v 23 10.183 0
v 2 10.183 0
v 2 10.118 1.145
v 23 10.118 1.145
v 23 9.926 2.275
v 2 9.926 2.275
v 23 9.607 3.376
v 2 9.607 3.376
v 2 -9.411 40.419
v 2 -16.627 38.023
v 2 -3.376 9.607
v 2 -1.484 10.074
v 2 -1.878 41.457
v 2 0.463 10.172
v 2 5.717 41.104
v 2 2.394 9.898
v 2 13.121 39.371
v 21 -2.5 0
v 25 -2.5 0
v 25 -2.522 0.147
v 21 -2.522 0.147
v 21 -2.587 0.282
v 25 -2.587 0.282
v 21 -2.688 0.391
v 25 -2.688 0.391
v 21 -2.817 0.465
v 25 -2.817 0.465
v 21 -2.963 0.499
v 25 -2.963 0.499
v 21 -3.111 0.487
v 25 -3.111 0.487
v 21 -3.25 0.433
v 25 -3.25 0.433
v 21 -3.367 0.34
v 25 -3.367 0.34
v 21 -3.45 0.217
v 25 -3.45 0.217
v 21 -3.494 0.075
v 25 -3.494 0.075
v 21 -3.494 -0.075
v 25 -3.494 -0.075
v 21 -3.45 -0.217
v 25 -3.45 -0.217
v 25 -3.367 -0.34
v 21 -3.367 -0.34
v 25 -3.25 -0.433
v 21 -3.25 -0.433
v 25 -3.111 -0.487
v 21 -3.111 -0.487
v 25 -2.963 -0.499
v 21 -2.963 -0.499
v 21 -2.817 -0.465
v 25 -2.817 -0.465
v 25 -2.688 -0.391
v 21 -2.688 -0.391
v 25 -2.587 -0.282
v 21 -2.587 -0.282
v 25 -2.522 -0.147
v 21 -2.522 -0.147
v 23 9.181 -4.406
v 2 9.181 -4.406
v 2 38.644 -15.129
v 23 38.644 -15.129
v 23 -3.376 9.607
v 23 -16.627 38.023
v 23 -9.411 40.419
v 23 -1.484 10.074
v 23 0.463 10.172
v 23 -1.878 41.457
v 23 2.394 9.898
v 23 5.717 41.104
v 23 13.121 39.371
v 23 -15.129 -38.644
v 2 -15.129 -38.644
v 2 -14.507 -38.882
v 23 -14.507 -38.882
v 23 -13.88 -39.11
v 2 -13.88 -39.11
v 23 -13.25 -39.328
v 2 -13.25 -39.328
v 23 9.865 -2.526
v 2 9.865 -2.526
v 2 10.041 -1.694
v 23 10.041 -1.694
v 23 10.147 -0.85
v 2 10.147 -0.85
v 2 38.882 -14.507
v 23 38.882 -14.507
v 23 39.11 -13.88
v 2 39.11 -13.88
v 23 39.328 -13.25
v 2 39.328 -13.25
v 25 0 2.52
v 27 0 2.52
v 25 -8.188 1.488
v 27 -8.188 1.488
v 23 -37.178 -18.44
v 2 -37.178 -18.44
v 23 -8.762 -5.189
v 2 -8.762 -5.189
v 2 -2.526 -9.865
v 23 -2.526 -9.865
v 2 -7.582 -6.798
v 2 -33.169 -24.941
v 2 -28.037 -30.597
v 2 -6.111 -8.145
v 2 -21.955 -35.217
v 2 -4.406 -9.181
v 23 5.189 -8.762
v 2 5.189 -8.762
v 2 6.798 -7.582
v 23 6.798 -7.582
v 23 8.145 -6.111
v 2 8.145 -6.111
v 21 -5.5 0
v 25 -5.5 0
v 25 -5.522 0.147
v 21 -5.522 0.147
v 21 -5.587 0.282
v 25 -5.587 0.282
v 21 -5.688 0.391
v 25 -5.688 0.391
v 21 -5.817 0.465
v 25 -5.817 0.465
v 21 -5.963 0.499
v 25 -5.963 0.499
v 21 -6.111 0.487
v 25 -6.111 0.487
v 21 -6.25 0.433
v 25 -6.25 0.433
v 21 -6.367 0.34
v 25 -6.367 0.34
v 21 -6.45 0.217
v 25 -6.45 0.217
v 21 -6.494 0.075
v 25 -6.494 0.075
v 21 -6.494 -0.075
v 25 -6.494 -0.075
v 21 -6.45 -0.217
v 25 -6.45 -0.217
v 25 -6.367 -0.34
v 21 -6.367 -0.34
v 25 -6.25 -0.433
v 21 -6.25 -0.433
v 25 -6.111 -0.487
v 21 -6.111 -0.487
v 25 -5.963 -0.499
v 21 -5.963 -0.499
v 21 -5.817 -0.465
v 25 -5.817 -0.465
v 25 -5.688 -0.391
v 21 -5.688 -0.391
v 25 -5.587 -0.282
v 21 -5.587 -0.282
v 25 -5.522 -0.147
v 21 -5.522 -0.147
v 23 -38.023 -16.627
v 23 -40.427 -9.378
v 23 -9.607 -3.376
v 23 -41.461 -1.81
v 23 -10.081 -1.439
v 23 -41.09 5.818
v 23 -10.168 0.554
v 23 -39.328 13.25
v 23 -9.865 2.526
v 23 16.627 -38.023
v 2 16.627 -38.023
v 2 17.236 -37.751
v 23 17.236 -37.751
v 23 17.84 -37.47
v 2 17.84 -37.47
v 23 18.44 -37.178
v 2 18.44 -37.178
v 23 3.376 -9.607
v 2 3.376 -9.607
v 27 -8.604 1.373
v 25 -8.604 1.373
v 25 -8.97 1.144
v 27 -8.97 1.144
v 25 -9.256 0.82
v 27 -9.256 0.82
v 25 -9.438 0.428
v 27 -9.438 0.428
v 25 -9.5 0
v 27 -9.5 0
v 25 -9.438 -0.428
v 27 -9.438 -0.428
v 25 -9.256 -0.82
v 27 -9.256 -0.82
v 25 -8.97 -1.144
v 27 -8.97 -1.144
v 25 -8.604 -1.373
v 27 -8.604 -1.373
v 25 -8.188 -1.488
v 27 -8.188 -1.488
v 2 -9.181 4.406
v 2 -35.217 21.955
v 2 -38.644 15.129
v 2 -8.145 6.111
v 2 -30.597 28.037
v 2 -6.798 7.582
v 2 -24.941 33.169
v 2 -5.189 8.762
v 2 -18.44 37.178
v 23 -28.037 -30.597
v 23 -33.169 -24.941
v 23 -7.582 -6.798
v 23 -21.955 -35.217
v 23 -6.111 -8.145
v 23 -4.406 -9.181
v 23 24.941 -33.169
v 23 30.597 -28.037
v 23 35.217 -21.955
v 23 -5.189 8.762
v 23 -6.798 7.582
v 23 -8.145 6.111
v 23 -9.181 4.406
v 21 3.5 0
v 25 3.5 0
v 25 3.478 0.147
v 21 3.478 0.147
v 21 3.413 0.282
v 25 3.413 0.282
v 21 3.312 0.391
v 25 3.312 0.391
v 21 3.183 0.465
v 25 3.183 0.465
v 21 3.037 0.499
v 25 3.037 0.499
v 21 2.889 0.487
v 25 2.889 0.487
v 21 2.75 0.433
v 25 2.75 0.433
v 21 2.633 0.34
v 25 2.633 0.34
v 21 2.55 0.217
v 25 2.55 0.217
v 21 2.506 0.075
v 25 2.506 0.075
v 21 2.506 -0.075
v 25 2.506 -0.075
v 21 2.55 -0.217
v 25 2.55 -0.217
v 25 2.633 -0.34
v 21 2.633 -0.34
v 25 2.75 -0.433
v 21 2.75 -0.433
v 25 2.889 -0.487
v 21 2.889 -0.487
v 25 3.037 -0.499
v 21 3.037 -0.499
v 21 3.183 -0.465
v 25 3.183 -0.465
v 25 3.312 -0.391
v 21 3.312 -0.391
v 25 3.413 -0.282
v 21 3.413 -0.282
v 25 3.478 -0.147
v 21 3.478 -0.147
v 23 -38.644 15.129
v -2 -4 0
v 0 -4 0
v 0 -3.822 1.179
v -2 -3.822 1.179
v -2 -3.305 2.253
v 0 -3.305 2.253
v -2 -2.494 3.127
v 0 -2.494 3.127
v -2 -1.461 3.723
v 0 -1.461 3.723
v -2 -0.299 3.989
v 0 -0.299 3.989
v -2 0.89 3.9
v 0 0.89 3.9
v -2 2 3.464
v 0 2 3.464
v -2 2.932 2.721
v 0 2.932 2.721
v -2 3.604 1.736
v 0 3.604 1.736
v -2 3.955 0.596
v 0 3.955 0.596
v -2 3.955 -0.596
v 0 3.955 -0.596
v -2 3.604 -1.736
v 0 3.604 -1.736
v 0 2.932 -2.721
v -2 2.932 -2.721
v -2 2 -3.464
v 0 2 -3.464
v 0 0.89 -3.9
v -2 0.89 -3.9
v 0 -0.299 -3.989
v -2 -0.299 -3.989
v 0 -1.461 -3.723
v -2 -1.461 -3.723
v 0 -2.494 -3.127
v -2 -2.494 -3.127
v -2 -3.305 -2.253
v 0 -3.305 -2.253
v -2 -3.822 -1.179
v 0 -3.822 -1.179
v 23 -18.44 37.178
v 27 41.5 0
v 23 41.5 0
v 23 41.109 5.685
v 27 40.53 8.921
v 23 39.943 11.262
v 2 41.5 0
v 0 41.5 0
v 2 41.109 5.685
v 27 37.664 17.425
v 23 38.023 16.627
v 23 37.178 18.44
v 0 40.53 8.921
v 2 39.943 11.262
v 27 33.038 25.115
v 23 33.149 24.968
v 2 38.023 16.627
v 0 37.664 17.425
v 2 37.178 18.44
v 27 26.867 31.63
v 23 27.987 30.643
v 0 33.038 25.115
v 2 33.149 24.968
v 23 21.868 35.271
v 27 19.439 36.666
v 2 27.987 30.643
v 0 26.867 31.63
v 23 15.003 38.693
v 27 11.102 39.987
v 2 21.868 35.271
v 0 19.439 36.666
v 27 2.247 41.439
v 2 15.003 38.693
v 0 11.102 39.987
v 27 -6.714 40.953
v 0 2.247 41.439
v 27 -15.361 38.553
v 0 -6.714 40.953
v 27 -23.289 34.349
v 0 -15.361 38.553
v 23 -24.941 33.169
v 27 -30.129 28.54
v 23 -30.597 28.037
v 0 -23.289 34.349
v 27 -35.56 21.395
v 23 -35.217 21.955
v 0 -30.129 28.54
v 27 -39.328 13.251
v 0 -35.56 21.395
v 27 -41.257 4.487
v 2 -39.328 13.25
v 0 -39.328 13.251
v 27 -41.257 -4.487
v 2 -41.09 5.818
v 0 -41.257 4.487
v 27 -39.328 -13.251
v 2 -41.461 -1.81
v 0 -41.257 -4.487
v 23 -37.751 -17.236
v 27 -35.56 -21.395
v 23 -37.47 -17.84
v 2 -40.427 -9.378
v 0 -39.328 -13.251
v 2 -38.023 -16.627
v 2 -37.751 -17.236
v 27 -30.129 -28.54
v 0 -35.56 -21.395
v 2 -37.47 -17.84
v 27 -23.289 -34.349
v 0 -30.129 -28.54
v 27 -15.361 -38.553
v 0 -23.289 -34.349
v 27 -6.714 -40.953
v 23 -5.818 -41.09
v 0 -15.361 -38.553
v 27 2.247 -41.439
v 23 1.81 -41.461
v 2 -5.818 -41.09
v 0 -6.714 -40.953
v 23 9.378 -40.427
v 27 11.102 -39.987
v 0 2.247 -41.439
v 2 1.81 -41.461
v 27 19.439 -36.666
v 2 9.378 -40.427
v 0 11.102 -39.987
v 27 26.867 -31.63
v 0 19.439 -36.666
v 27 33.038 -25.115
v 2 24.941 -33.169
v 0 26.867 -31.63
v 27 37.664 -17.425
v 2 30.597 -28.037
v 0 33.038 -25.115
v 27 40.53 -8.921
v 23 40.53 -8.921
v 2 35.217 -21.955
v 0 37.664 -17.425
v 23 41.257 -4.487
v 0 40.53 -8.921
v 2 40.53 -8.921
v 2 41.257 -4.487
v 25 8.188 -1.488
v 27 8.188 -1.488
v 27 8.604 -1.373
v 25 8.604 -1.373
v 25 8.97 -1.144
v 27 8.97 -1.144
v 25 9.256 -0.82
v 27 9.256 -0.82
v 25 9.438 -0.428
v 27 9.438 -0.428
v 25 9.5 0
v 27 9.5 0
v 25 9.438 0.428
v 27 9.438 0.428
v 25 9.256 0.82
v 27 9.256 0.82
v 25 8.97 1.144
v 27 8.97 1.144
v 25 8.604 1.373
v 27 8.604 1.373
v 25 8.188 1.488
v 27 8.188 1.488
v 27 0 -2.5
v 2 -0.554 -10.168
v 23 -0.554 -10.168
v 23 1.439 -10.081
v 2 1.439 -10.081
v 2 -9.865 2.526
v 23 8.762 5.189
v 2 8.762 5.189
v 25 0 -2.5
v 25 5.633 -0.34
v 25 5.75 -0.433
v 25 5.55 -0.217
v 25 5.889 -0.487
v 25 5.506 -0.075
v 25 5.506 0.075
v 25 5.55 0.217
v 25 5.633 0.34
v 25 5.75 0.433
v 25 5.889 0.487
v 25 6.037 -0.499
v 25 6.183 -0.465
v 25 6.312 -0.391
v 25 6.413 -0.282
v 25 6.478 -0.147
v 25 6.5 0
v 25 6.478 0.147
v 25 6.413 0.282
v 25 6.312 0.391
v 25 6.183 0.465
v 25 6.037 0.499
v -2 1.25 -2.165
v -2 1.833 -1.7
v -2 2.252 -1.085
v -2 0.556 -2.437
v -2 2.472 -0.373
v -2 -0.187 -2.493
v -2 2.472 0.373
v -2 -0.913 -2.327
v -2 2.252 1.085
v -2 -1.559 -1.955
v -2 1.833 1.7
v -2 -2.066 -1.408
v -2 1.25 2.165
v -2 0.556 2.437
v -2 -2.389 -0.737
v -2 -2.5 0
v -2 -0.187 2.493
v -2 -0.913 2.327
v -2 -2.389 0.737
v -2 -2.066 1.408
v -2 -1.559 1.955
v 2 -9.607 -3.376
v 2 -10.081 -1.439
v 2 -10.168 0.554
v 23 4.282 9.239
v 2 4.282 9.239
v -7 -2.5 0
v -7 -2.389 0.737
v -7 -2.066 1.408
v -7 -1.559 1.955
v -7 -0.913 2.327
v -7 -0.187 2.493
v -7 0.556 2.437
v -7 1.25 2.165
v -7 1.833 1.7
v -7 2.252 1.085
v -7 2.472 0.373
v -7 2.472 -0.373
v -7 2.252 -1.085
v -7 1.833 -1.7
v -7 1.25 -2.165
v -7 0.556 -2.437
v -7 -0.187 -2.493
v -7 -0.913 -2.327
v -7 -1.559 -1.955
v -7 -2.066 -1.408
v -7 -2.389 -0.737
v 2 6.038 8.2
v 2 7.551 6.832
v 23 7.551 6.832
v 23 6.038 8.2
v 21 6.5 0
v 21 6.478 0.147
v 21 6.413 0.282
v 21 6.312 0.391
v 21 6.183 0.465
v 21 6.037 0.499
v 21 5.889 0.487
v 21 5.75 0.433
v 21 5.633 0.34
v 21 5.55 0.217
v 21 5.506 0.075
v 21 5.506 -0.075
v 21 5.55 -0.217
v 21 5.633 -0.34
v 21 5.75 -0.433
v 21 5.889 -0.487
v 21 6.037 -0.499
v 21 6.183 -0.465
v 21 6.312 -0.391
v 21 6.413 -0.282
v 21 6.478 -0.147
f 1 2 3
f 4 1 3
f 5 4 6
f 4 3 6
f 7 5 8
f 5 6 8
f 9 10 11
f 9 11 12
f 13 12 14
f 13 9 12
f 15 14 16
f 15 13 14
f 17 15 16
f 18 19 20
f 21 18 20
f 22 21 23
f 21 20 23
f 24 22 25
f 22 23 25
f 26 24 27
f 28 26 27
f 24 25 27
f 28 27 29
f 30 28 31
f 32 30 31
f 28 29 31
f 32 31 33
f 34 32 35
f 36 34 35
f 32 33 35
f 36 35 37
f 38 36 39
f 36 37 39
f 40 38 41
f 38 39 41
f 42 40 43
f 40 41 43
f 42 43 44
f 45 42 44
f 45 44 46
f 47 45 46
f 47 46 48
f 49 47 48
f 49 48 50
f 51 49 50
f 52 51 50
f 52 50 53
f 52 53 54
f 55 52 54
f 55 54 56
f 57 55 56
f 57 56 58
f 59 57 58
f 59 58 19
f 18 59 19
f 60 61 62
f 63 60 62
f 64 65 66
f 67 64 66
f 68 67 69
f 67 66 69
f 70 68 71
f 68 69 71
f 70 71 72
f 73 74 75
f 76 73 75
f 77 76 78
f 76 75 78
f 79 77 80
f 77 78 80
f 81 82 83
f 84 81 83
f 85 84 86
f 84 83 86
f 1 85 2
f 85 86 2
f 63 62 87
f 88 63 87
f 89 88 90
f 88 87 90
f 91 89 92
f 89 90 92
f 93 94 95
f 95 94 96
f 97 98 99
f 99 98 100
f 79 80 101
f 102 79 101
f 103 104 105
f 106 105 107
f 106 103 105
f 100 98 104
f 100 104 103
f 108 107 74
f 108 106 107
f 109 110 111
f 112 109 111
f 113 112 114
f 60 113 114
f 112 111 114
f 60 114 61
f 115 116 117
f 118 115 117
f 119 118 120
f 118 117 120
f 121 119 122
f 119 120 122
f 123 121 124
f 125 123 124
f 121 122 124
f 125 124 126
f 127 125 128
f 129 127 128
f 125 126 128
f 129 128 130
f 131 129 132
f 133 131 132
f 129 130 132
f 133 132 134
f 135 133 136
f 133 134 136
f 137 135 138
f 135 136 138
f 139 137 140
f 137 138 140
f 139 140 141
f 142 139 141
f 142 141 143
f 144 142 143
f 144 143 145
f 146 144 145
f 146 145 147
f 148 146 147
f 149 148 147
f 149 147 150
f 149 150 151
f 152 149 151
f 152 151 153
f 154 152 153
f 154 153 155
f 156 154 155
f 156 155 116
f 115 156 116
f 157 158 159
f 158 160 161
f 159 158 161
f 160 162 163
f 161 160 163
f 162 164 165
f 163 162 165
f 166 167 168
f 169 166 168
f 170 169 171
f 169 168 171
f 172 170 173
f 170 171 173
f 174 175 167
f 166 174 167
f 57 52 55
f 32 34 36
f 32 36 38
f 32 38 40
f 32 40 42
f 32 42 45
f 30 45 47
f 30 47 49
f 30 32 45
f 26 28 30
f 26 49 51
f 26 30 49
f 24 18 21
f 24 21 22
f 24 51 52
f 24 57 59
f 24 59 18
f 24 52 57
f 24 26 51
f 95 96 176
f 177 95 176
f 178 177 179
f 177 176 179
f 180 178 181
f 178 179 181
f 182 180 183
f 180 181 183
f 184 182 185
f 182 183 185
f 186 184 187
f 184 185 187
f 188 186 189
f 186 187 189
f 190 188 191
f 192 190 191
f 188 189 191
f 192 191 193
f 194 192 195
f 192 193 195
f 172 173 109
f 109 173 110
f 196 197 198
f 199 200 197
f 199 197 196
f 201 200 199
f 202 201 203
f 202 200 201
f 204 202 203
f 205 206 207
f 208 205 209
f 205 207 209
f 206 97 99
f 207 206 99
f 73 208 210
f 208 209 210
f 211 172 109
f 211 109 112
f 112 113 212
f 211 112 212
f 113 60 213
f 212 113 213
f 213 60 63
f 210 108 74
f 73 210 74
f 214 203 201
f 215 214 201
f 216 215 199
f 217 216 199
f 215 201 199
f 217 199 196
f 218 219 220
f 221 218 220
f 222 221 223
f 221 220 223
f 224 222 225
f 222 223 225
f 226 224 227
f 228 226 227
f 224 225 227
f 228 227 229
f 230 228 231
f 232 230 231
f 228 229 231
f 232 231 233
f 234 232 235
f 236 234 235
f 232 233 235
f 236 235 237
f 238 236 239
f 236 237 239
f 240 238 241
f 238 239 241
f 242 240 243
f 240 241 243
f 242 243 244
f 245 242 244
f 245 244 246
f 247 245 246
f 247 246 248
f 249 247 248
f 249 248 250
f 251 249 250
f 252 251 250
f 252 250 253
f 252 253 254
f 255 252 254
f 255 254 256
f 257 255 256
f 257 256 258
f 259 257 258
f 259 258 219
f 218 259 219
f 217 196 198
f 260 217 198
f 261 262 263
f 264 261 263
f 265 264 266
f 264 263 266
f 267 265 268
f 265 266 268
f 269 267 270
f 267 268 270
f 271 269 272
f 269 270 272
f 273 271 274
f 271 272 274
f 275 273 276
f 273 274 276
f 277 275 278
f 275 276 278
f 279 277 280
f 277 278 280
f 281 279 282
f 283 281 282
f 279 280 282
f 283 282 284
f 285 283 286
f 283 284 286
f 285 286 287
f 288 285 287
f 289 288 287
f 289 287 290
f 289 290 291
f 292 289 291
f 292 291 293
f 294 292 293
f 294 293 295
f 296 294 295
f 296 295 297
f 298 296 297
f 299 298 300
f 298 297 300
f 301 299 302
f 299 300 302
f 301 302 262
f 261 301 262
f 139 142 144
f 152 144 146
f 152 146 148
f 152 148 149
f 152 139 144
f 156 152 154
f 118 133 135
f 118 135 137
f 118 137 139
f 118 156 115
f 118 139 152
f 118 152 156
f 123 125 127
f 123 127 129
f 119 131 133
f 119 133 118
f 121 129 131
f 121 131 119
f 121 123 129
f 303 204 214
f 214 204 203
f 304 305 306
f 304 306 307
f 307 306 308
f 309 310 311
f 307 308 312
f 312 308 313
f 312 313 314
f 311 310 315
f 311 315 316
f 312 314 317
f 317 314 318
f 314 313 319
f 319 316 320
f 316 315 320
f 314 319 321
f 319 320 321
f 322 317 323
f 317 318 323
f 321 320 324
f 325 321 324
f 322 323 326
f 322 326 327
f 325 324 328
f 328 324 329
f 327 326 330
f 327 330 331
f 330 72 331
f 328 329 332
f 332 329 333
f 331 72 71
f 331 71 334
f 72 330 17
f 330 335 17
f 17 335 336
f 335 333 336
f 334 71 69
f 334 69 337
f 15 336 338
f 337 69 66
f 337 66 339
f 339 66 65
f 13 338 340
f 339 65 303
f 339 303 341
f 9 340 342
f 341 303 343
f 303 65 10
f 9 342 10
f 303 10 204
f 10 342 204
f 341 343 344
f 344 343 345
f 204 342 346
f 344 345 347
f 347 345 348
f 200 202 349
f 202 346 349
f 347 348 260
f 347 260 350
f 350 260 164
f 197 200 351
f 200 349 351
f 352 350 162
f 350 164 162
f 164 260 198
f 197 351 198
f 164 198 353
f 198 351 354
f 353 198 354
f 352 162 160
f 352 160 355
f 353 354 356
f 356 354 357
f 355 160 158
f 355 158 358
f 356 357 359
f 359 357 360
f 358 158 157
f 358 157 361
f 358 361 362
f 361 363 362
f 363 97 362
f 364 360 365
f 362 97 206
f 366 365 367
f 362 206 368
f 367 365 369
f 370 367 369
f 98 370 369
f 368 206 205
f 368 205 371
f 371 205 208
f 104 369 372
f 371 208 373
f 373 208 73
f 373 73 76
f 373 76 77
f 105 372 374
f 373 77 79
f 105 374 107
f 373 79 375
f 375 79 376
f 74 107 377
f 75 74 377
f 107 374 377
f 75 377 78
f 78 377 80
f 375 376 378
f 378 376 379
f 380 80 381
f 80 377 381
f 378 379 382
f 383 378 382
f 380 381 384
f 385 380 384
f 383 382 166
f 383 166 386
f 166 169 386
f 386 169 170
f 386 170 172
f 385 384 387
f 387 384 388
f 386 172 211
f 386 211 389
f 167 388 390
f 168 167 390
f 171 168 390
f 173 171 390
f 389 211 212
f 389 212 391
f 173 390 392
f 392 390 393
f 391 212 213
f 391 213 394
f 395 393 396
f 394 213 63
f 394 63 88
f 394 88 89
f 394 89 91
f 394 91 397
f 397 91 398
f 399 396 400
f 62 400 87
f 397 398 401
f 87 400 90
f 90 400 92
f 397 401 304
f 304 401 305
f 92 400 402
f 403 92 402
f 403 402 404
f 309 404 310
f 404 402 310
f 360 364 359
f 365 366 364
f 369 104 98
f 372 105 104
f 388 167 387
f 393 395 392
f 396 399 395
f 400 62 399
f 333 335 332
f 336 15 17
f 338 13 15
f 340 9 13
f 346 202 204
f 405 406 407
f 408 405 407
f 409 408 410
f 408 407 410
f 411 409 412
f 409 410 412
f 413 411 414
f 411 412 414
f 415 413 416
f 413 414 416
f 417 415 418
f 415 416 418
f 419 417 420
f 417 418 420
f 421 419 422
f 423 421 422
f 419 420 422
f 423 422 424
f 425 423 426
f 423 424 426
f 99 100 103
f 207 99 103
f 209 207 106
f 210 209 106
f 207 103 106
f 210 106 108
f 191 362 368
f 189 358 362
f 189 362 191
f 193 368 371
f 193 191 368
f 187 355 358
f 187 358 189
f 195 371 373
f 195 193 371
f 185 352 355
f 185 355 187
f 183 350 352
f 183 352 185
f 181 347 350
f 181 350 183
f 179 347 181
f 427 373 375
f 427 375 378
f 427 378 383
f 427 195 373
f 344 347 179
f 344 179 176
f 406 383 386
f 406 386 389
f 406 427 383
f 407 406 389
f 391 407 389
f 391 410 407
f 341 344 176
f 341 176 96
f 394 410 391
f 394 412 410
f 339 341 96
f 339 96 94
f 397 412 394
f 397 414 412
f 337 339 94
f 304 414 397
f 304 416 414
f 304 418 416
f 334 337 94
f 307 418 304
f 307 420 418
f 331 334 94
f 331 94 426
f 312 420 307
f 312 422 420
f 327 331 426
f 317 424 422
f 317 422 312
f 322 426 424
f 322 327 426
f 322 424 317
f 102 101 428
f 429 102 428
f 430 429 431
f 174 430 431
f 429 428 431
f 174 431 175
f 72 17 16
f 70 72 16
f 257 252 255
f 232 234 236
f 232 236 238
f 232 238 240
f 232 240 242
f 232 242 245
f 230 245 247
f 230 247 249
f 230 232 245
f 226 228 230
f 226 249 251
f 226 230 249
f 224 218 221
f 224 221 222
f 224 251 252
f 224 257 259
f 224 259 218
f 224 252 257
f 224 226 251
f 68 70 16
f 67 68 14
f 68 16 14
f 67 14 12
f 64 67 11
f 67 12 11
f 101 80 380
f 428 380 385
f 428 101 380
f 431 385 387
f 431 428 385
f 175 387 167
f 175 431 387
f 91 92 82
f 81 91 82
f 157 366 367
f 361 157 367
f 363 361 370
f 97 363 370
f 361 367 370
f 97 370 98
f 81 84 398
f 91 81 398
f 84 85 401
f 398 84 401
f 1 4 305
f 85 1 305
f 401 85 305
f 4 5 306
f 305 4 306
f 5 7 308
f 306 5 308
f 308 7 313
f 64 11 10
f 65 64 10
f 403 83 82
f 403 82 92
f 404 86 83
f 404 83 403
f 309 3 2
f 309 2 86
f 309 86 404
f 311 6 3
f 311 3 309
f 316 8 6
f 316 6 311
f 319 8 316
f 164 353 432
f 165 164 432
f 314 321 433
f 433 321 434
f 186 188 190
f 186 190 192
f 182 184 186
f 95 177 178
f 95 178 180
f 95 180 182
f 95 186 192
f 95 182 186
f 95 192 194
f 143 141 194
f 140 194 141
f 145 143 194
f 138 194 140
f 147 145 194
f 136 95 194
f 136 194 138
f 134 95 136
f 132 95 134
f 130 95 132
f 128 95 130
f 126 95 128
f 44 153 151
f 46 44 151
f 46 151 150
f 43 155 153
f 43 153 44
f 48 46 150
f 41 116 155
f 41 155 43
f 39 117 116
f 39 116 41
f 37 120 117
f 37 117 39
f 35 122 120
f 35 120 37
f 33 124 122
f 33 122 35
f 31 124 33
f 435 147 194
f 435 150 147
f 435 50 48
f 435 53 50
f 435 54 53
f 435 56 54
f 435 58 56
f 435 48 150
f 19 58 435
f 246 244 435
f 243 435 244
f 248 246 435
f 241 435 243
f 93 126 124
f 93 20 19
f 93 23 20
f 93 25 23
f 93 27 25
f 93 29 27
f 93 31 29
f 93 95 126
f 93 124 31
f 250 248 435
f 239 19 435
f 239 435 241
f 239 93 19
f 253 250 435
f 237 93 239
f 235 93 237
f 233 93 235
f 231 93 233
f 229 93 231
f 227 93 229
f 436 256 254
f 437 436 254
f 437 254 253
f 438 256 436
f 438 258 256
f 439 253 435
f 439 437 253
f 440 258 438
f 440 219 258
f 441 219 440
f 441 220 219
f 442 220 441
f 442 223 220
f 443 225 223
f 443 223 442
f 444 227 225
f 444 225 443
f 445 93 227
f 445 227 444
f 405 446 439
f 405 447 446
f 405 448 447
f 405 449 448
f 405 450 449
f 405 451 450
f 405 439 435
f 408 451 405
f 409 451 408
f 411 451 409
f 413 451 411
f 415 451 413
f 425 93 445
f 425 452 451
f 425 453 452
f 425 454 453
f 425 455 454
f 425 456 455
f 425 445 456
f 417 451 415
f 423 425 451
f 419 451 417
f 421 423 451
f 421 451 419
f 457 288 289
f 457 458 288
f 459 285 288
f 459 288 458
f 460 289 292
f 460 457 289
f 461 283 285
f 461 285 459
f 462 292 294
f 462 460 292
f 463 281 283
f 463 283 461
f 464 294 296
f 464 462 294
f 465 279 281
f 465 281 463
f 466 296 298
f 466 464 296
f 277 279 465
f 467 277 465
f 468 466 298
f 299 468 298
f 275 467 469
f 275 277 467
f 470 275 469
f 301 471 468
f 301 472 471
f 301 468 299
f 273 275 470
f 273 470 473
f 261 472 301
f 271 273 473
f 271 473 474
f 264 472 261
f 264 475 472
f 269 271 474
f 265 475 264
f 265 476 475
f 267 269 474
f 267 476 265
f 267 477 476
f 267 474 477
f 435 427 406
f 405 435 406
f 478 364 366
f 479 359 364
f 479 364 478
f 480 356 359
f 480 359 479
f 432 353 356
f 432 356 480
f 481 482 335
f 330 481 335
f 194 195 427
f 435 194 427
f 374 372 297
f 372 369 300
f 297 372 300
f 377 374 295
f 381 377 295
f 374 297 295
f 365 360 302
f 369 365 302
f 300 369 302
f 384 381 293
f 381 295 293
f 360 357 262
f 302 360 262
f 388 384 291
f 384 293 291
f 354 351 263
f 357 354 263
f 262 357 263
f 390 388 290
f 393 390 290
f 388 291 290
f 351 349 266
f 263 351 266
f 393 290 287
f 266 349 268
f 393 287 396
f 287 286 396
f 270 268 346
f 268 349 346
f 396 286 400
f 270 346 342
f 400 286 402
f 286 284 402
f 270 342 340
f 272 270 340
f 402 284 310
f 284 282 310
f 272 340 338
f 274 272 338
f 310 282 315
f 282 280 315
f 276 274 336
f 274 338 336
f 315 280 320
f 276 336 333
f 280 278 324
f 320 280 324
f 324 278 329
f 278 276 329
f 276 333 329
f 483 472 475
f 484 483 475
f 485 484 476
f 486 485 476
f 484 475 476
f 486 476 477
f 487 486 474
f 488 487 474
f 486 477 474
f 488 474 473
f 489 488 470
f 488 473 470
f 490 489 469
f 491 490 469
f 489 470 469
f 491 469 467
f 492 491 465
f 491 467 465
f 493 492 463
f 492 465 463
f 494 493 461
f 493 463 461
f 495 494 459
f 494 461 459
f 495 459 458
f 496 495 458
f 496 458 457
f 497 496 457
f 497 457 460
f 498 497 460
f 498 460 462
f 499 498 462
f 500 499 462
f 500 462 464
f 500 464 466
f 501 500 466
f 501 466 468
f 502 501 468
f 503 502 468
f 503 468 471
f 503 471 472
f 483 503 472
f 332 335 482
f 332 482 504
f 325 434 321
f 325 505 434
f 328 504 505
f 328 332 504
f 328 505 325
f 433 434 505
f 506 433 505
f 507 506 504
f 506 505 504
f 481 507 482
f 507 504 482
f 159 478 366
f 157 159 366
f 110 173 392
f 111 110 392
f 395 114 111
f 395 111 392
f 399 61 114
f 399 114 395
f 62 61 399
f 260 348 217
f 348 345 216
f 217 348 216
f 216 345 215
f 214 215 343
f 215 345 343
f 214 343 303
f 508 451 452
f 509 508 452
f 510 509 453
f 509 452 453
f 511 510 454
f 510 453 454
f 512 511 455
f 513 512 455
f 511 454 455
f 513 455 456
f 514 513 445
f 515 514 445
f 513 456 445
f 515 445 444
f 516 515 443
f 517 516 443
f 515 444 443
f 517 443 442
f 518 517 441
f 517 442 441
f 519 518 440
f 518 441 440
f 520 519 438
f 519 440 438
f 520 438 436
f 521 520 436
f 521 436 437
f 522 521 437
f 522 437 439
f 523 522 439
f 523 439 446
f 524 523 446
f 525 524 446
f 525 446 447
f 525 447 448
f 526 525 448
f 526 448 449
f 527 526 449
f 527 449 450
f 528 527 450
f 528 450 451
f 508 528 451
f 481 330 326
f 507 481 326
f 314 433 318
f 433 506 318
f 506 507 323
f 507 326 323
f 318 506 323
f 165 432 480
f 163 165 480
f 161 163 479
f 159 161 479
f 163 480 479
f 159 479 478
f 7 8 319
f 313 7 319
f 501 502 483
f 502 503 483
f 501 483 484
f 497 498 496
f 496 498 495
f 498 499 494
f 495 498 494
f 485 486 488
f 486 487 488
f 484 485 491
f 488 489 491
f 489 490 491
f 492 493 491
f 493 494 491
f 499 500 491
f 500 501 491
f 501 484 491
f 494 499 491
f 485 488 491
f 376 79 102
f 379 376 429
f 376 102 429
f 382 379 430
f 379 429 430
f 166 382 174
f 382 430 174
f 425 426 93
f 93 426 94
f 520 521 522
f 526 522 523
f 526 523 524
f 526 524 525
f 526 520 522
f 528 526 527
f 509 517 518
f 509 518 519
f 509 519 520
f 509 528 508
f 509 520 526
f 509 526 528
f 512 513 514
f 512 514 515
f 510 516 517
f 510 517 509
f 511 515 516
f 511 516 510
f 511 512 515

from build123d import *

# Parameters (mm, degrees)
F0_R      = 41.5
F1_DEPTH  = 2
F3_DEPTH  = 21
F4_R      = 41.5
F5_DEPTH  = 2
F6_R      = 4
F6_R_2    = 2.5
F7_DEPTH  = 2
F8_DEPTH  = 7
F10_R     = 41.5
F11_DEPTH = 2
F13_R     = 0.5
F14_DEPTH = 2
F15_DEPTH = 6


with BuildPart() as f1:
    # F0 (on Right) → F1 (new body)
    with BuildSketch(Plane.YZ):
        Circle(F0_R)
    extrude(amount=F1_DEPTH)

    # F2 (on face) → F3 (join)
    with BuildSketch(Plane.YZ.offset(2)):
        with BuildLine():
            ThreePointArc((9.8646073485, -2.5262456751), (10.1030481106, -1.2731120236), (10.1829463001, 0))
            ThreePointArc((10.1829463001, 0), (10.037899881, 1.7125890722), (9.6068927211, 3.376389728))
            ThreePointArc((9.6068927211, 3.376389728), (9.2288835267, 4.3034990647), (8.7616561977, 5.189005302))
            ThreePointArc((8.7616561977, 5.189005302), (6.8289840342, 7.5536330604), (4.2820740528, 9.2388439297))
            ThreePointArc((4.2820740528, 9.2388439297), (3.3540046296, 9.6147307968), (2.3935052702, 9.8976526446))
            ThreePointArc((2.3935052702, 9.8976526446), (-0.5124946806, 10.1700415217), (-3.376389728, 9.6068927211))
            ThreePointArc((-3.376389728, 9.6068927211), (-4.3034990647, 9.2288835267), (-5.189005302, 8.7616561977))
            ThreePointArc((-5.189005302, 8.7616561977), (-7.507655529, 6.879498805), (-9.1805670618, 4.4056309167))
            ThreePointArc((-9.1805670618, 4.4056309167), (-9.5688394961, 3.482772753), (-9.8646073485, 2.5262456751))
            ThreePointArc((-9.8646073485, 2.5262456751), (-10.1732543916, -0.4441738792), (-9.6068927211, -3.376389728))
            ThreePointArc((-9.6068927211, -3.376389728), (-9.2288835267, -4.3034990647), (-8.7616561977, -5.189005302))
            ThreePointArc((-8.7616561977, -5.189005302), (-6.879498805, -7.507655529), (-4.4056309167, -9.1805670618))
            ThreePointArc((-4.4056309167, -9.1805670618), (-3.482772753, -9.5688394961), (-2.5262456751, -9.8646073485))
            ThreePointArc((-2.5262456751, -9.8646073485), (0.4441738792, -10.1732543916), (3.376389728, -9.6068927211))
            ThreePointArc((3.376389728, -9.6068927211), (4.3034990647, -9.2288835267), (5.189005302, -8.7616561977))
            ThreePointArc((5.189005302, -8.7616561977), (7.507655529, -6.879498805), (9.1805670618, -4.4056309167))
            ThreePointArc((9.1805670618, -4.4056309167), (9.5688394961, -3.482772753), (9.8646073485, -2.5262456751))
        make_face()
        with BuildLine():
            ThreePointArc((2.3935052702, 9.8976526446), (3.3540046296, 9.6147307968), (4.2820740528, 9.2388439297))
            Line((4.2820740528, 9.2388439297), (15.0026191162, 38.6932994155))
            ThreePointArc((15.0026191162, 38.6932994155), (14.0658892352, 39.043575144), (13.1209909217, 39.3711772396))
            Line((13.1209909217, 39.3711772396), (2.3935052702, 9.8976526446))
        make_face()
        with BuildLine():
            ThreePointArc((-5.189005302, 8.7616561977), (-4.3034990647, 9.2288835267), (-3.376389728, 9.6068927211))
            Line((-3.376389728, 9.6068927211), (-16.6272575496, 38.0234704673))
            ThreePointArc((-16.6272575496, 38.0234704673), (-17.5386578622, 37.611773162), (-18.4398731237, 37.1782339438))
            Line((-18.4398731237, 37.1782339438), (-5.189005302, 8.7616561977))
        make_face()
        with BuildLine():
            ThreePointArc((8.7616561977, 5.189005302), (9.2288835267, 4.3034990647), (9.6068927211, 3.376389728))
            Line((9.6068927211, 3.376389728), (38.0234704673, 16.6272575496))
            ThreePointArc((38.0234704673, 16.6272575496), (37.611773162, 17.5386578622), (37.1782339438, 18.4398731237))
            Line((37.1782339438, 18.4398731237), (8.7616561977, 5.189005302))
        make_face()
        with BuildLine():
            Line((39.3279406642, -13.2500220043), (9.8646073485, -2.5262456751))
            ThreePointArc((9.8646073485, -2.5262456751), (9.5688394961, -3.482772753), (9.1805670618, -4.4056309167))
            Line((9.1805670618, -4.4056309167), (38.6439003775, -15.1294072458))
            ThreePointArc((38.6439003775, -15.1294072458), (38.9972437626, -14.193835948), (39.3279406642, -13.2500220043))
        make_face()
        with BuildLine():
            Line((18.4398731237, -37.1782339438), (5.189005302, -8.7616561977))
            ThreePointArc((5.189005302, -8.7616561977), (4.3034990647, -9.2288835267), (3.376389728, -9.6068927211))
            Line((3.376389728, -9.6068927211), (16.6272575496, -38.0234704673))
            ThreePointArc((16.6272575496, -38.0234704673), (17.5386578622, -37.611773162), (18.4398731237, -37.1782339438))
        make_face()
        with BuildLine():
            Line((-13.2500220043, -39.3279406642), (-2.5262456751, -9.8646073485))
            ThreePointArc((-2.5262456751, -9.8646073485), (-3.482772753, -9.5688394961), (-4.4056309167, -9.1805670618))
            Line((-4.4056309167, -9.1805670618), (-15.1294072458, -38.6439003775))
            ThreePointArc((-15.1294072458, -38.6439003775), (-14.193835948, -38.9972437626), (-13.2500220043, -39.3279406642))
        make_face()
        with BuildLine():
            ThreePointArc((-9.8646073485, 2.5262456751), (-9.5688394961, 3.482772753), (-9.1805670618, 4.4056309167))
            Line((-9.1805670618, 4.4056309167), (-38.6439003775, 15.1294072458))
            ThreePointArc((-38.6439003775, 15.1294072458), (-38.9972437626, 14.193835948), (-39.3279406642, 13.2500220043))
            Line((-39.3279406642, 13.2500220043), (-9.8646073485, 2.5262456751))
        make_face()
        with BuildLine():
            Line((-37.1782339438, -18.4398731237), (-8.7616561977, -5.189005302))
            ThreePointArc((-8.7616561977, -5.189005302), (-9.2288835267, -4.3034990647), (-9.6068927211, -3.376389728))
            Line((-9.6068927211, -3.376389728), (-38.0234704673, -16.6272575496))
            ThreePointArc((-38.0234704673, -16.6272575496), (-37.611773162, -17.5386578622), (-37.1782339438, -18.4398731237))
        make_face()
    extrude(amount=F3_DEPTH)

    # F4 (on face) → F5 (join)
    with BuildSketch(Plane.YZ.offset(23)):
        Circle(F4_R)
    extrude(amount=F5_DEPTH)

    # F6 (on face) → F7 (join)
    with BuildSketch(Plane(origin=(0, 0, 0), x_dir=(0, -1, 0), z_dir=(-1, 0, 0))):
        Circle(F6_R)
        Circle(F6_R_2, mode=Mode.SUBTRACT)
    extrude(amount=F7_DEPTH)

    # F8 (add): a face of the model
    f8_faces = [f1.faces().sort_by_distance(p)[0] for p in [
        (0, 0, 0),
    ]]
    extrude(f8_faces, amount=F8_DEPTH)

    # F10 (on face) → F11 (join)
    with BuildSketch(Plane.YZ.offset(25)):
        Circle(F10_R)
    extrude(amount=F11_DEPTH)

    # F13 (on face) → F14 (cut)
    with BuildSketch(Plane.YZ.offset(27)):
        with BuildLine():
            Line((0, -2.5), (8.1875, -1.4882351125))
            ThreePointArc((8.1875, -1.4882351125), (9.5, 0), (8.1875, 1.4882351125))
            Line((8.1875, 1.4882351125), (0, 2.5197631534))
            Line((0, 2.5197631534), (-8.1875, 1.4882351125))
            ThreePointArc((-8.1875, 1.4882351125), (-9.5, 0), (-8.1875, -1.4882351125))
            Line((-8.1875, -1.4882351125), (0, -2.5))
        make_face()
        with Locations((-6, 0)):
            Circle(F13_R, mode=Mode.SUBTRACT)
        with Locations((-3, 0)):
            Circle(F13_R, mode=Mode.SUBTRACT)
        with Locations((3, 0)):
            Circle(F13_R, mode=Mode.SUBTRACT)
        with Locations((6, 0)):
            Circle(F13_R, mode=Mode.SUBTRACT)
    extrude(amount=-F14_DEPTH, mode=Mode.SUBTRACT)

    # F15 (cut): faces of the model
    f15_faces = [f1.faces().sort_by_distance(p)[0] for p in [
        (27, -3, 0),
        (27, -6, 0),
        (27, 3, 0),
        (27, 6, 0),
    ]]
    extrude(f15_faces, amount=-F15_DEPTH, mode=Mode.SUBTRACT)


solid = f1.part
